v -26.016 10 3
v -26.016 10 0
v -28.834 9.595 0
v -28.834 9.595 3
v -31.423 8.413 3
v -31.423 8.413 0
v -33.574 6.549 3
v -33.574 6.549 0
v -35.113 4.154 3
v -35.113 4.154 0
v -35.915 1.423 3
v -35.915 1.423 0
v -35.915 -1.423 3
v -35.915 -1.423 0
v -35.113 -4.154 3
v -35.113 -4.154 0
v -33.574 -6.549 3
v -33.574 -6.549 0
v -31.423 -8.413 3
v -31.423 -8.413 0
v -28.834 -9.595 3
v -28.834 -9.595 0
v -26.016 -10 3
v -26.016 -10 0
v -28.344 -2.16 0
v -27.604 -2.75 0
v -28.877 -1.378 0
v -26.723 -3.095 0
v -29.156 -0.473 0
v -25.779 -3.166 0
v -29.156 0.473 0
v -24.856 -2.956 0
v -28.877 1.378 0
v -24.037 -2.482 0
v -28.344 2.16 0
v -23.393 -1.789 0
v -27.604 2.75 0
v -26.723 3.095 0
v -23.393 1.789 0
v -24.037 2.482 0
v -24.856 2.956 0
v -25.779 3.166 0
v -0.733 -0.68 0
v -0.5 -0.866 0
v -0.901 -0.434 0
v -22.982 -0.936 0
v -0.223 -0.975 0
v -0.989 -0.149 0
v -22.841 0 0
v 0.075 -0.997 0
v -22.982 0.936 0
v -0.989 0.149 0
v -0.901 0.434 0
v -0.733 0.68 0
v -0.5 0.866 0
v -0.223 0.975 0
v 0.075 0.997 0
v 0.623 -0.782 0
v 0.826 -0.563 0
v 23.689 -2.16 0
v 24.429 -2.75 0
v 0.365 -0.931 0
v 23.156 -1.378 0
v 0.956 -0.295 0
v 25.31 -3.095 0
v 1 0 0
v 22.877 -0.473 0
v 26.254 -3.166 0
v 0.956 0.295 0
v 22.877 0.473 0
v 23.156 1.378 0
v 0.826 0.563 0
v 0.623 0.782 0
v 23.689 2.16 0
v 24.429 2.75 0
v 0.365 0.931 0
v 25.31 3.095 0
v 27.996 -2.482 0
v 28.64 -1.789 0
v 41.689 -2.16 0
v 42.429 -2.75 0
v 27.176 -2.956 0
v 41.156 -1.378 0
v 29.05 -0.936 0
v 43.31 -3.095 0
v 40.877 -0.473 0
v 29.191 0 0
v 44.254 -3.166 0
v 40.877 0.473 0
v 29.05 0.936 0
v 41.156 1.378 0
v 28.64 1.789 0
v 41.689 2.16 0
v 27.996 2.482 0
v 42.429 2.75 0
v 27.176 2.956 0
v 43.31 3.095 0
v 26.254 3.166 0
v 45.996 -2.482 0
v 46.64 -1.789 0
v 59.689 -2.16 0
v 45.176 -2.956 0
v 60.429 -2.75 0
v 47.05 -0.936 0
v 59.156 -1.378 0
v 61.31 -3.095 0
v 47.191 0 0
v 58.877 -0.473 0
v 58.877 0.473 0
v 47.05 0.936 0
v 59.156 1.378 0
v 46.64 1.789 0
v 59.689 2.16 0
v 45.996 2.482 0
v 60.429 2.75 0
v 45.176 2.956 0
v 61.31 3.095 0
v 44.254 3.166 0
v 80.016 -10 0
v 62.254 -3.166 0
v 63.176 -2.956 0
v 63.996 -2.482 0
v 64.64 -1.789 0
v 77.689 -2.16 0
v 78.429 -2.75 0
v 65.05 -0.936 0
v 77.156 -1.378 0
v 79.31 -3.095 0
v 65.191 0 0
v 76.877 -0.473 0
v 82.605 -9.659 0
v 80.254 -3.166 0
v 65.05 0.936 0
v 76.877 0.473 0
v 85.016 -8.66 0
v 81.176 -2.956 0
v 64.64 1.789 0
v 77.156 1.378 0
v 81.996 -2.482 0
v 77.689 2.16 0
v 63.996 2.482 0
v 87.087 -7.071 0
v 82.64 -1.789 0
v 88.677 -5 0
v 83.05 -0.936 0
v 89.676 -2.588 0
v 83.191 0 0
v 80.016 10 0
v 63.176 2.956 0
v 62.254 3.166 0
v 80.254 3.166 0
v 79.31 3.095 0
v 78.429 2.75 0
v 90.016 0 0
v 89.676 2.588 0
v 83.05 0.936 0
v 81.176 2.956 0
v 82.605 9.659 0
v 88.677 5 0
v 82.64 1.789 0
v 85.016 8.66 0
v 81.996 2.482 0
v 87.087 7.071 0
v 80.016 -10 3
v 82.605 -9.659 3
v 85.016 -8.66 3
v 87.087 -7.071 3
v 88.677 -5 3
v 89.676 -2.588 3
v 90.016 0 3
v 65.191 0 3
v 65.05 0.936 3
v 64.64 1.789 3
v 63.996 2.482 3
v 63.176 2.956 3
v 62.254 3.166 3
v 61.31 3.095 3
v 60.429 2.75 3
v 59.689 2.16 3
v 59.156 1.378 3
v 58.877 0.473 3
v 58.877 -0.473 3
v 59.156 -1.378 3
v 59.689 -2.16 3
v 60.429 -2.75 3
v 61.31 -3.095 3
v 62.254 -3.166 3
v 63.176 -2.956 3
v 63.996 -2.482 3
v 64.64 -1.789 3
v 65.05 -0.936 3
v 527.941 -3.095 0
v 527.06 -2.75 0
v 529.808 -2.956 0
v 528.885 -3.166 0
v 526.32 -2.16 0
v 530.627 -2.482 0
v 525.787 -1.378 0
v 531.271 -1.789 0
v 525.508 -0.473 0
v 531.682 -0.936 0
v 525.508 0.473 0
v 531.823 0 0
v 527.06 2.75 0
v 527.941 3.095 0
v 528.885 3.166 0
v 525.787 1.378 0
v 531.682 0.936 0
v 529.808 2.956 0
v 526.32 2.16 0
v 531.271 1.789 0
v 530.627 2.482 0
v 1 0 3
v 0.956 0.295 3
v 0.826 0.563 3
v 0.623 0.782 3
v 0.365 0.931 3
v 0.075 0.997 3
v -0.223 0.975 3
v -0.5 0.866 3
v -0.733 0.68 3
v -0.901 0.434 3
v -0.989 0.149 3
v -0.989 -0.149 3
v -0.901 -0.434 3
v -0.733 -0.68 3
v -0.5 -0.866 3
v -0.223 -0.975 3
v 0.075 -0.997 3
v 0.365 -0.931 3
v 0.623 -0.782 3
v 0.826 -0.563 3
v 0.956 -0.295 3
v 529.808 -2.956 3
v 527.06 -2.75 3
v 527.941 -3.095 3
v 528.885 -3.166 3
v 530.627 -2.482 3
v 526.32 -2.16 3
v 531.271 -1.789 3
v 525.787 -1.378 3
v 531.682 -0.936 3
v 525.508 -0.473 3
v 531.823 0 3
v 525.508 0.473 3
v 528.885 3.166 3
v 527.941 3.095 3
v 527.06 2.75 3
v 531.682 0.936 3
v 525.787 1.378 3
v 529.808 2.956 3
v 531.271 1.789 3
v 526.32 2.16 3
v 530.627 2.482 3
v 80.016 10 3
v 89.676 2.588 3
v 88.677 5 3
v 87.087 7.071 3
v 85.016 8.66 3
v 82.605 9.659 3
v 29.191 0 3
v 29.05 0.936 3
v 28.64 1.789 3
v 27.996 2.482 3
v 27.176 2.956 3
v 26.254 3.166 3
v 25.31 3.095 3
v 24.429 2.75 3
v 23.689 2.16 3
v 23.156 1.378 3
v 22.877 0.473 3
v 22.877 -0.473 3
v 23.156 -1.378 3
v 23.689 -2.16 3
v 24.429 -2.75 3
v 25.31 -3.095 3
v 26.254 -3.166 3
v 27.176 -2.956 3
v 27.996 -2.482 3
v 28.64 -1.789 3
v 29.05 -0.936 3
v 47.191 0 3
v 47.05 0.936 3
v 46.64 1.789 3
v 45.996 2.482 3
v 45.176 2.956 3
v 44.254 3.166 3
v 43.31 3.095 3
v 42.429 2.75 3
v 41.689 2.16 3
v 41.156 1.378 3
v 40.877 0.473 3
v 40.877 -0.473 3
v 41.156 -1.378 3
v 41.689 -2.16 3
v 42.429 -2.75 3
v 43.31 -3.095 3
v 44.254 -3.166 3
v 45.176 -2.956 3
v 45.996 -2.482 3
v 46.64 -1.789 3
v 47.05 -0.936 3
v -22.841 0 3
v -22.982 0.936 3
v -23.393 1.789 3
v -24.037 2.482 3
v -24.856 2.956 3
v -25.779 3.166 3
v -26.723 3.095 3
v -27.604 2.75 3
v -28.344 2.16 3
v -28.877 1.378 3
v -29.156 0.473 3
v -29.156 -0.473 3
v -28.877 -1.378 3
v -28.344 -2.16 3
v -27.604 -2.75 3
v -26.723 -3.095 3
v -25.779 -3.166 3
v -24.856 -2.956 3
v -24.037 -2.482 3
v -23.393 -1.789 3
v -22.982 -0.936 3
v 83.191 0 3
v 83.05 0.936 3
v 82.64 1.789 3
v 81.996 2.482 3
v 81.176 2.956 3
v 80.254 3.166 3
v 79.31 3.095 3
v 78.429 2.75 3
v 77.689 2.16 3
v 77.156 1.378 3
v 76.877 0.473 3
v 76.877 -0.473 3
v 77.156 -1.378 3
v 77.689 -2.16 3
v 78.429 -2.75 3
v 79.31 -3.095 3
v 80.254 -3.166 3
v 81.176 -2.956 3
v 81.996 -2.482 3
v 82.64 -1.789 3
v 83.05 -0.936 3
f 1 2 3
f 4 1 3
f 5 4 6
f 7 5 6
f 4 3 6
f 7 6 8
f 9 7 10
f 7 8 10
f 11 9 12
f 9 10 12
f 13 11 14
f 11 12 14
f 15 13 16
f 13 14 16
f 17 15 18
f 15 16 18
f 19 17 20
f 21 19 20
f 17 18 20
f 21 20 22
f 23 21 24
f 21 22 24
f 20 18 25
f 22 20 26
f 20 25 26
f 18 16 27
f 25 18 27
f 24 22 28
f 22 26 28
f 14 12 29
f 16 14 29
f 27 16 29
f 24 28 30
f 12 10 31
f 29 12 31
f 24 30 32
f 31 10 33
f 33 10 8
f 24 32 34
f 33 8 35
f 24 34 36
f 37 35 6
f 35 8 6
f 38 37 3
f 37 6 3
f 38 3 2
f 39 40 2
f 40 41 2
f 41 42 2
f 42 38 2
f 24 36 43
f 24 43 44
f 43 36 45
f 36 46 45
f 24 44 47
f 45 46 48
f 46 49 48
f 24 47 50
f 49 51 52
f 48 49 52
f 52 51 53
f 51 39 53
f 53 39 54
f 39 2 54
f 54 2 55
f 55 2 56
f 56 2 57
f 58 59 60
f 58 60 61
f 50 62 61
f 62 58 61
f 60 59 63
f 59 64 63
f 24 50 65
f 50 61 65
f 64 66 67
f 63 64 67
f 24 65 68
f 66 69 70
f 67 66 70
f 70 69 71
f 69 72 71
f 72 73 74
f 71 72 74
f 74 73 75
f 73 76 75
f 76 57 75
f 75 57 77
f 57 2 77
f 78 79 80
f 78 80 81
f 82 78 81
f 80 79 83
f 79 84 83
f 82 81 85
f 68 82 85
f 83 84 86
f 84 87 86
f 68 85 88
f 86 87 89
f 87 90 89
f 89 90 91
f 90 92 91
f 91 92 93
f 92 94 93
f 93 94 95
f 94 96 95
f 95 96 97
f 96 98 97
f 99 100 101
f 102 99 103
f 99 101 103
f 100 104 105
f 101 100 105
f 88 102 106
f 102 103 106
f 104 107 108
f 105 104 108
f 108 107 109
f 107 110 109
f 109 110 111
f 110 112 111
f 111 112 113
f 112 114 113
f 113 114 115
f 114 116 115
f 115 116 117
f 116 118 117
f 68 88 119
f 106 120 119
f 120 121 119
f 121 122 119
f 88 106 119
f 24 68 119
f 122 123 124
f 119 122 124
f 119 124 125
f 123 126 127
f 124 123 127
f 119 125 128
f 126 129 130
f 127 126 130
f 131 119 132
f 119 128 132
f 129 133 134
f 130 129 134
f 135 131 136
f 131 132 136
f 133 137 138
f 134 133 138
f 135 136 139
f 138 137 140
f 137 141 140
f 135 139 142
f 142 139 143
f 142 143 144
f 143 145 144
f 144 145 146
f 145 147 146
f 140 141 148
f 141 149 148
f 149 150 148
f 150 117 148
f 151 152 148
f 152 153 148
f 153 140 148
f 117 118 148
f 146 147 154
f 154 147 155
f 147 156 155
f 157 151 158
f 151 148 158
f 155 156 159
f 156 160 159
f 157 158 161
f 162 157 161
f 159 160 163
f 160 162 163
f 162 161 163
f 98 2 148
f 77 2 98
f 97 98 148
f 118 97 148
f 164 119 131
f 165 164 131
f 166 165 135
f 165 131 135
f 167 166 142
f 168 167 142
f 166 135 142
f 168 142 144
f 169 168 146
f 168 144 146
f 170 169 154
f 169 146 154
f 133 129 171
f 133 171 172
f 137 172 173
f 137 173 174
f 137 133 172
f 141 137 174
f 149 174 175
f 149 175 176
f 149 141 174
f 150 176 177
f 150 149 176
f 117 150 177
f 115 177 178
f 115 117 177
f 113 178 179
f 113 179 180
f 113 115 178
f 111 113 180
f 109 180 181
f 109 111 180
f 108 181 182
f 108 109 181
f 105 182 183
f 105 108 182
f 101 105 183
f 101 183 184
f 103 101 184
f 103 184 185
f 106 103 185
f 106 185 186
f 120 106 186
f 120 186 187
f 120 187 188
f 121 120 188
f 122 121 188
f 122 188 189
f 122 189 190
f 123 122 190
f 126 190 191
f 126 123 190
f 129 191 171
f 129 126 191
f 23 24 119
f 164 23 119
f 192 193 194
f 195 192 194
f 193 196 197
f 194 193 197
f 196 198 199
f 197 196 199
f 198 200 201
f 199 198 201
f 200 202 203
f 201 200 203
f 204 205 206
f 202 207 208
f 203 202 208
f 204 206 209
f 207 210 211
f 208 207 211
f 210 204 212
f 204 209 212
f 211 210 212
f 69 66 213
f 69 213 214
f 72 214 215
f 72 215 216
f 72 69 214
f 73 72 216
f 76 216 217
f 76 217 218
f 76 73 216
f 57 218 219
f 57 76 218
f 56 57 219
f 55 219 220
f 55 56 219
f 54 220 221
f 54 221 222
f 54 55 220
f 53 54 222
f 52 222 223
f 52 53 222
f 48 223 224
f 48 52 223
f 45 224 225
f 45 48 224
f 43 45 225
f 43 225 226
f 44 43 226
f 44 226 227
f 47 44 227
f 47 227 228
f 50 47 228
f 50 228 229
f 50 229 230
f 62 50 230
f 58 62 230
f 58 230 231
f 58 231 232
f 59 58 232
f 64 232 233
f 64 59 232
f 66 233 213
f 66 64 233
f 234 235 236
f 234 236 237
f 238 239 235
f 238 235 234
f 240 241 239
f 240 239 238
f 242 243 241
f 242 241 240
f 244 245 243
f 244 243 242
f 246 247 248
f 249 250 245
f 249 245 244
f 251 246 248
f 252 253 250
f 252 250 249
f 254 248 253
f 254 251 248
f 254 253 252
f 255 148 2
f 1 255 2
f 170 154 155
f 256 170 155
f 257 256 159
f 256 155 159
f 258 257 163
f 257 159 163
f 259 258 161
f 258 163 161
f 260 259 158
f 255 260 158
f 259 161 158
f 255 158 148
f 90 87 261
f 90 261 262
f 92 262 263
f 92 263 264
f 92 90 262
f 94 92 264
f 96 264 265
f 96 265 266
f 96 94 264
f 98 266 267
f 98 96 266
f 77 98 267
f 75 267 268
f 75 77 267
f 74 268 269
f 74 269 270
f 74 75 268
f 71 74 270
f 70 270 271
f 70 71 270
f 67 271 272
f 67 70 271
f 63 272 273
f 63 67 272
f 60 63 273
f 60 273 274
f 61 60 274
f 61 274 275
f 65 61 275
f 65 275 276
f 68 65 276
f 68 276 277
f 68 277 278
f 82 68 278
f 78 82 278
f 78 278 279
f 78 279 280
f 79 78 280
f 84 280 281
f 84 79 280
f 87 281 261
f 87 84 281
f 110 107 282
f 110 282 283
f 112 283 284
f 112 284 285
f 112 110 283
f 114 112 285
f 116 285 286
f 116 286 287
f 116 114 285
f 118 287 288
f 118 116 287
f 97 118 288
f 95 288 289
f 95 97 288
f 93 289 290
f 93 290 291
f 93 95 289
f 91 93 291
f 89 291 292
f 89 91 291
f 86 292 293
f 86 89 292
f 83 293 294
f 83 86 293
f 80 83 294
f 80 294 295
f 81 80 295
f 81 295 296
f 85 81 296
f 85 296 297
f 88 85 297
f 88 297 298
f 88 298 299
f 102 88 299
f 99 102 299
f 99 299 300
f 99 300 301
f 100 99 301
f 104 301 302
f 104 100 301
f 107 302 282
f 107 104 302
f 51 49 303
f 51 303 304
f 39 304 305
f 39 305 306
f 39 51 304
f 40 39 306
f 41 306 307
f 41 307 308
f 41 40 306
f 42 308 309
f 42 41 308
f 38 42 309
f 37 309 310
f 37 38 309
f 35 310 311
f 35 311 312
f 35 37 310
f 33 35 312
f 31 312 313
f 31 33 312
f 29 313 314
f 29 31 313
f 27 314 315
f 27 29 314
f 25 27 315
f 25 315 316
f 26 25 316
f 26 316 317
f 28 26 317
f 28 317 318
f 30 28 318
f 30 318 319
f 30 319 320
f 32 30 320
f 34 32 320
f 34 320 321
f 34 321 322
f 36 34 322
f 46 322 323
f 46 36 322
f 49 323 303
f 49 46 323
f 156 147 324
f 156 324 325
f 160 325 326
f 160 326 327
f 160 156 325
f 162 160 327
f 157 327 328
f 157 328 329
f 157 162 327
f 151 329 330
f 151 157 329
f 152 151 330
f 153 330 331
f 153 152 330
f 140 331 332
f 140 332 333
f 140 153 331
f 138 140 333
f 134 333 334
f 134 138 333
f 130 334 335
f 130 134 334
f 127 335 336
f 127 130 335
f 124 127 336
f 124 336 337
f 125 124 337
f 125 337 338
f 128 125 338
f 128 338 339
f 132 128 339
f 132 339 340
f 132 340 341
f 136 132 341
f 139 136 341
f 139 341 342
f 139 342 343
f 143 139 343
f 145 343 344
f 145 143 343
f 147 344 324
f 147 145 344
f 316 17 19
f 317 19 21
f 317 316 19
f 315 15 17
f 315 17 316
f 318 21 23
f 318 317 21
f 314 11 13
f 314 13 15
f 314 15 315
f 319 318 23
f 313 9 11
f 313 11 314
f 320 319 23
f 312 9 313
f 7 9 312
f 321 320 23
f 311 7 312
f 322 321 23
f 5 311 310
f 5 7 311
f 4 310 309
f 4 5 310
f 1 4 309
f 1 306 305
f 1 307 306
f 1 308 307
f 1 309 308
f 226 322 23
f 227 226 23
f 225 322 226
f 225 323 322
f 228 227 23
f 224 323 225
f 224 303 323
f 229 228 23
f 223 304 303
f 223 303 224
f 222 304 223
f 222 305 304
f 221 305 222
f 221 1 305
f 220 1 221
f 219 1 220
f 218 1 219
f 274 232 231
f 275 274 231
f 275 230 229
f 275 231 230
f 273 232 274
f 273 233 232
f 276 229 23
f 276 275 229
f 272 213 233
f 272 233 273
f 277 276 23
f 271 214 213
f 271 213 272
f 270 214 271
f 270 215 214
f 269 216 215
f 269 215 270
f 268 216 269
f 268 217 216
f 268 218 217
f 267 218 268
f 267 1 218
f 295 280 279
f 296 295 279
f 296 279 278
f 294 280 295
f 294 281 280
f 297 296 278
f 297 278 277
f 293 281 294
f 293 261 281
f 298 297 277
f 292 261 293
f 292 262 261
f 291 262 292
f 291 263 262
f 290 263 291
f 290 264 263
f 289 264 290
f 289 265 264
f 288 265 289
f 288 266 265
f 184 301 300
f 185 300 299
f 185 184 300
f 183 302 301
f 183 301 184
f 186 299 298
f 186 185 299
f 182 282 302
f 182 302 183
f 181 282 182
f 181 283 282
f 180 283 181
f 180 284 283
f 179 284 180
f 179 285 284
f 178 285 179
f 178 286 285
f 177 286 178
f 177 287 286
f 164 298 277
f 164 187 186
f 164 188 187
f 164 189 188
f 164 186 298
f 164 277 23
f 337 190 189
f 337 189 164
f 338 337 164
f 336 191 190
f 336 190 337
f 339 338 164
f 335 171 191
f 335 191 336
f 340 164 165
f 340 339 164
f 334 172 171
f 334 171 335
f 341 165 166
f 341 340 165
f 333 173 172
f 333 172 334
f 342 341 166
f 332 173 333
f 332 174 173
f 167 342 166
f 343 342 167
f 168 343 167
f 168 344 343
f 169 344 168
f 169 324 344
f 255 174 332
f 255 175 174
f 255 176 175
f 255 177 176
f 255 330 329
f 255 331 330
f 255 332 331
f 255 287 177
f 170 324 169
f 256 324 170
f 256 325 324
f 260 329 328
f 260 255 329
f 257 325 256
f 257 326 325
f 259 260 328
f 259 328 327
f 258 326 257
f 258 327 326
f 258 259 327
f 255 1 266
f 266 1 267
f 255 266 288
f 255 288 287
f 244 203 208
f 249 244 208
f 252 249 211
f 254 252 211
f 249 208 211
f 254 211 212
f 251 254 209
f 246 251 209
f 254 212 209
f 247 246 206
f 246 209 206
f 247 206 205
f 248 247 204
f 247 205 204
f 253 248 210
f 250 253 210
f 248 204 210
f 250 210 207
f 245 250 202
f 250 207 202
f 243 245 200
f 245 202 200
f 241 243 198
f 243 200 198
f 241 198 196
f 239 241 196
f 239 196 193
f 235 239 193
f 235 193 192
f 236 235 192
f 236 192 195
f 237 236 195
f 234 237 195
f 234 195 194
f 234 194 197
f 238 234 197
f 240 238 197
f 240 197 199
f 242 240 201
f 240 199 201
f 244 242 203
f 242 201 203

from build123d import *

# Parameters (mm, degrees)
F0_R     = 3.175
F0_R_2   = 1
F1_DEPTH = 3


with BuildPart() as f1:
    # F0 (on Top) → F1 (new body)
    with BuildSketch(Plane.XY):
        with Locations((528.647679, 0)):
            Circle(F0_R)
        with BuildLine():
            ThreePointArc((80.016351, -10), (87.087419, -7.071068), (90.016351, 0))
            ThreePointArc((90.016351, 0), (87.087419, 7.071068), (80.016351, 10))
            ThreePointArc((80.016351, 10), (70.016351, 0), (80.016351, -10))
        make_face()
        with Locations((80.016351, 0)):
            Circle(F0_R, mode=Mode.SUBTRACT)
        with BuildLine():
            ThreePointArc((80.016351, -10), (70.016351, 0), (80.016351, 10))
            Line((80.016351, 10), (-26.016351, 10))
            ThreePointArc((-26.016351, 10), (-18.945283, 7.071068), (-16.016351, 0))
            ThreePointArc((-16.016351, 0), (-18.945283, -7.071068), (-26.016351, -10))
            Line((-26.016351, -10), (80.016351, -10))
        make_face()
        Circle(F0_R_2, mode=Mode.SUBTRACT)
        with Locations((26.016351, 0)):
            Circle(F0_R, mode=Mode.SUBTRACT)
        with Locations((44.016351, 0)):
            Circle(F0_R, mode=Mode.SUBTRACT)
        with Locations((62.016351, 0)):
            Circle(F0_R, mode=Mode.SUBTRACT)
        with BuildLine():
            ThreePointArc((-16.016351, 0), (-18.945283, 7.071068), (-26.016351, 10))
            ThreePointArc((-26.016351, 10), (-36.016351, 0), (-26.016351, -10))
            ThreePointArc((-26.016351, -10), (-18.945283, -7.071068), (-16.016351, 0))
        make_face()
        with Locations((-26.016351, 0)):
            Circle(F0_R, mode=Mode.SUBTRACT)
    extrude(amount=F1_DEPTH)


solid = f1.part
